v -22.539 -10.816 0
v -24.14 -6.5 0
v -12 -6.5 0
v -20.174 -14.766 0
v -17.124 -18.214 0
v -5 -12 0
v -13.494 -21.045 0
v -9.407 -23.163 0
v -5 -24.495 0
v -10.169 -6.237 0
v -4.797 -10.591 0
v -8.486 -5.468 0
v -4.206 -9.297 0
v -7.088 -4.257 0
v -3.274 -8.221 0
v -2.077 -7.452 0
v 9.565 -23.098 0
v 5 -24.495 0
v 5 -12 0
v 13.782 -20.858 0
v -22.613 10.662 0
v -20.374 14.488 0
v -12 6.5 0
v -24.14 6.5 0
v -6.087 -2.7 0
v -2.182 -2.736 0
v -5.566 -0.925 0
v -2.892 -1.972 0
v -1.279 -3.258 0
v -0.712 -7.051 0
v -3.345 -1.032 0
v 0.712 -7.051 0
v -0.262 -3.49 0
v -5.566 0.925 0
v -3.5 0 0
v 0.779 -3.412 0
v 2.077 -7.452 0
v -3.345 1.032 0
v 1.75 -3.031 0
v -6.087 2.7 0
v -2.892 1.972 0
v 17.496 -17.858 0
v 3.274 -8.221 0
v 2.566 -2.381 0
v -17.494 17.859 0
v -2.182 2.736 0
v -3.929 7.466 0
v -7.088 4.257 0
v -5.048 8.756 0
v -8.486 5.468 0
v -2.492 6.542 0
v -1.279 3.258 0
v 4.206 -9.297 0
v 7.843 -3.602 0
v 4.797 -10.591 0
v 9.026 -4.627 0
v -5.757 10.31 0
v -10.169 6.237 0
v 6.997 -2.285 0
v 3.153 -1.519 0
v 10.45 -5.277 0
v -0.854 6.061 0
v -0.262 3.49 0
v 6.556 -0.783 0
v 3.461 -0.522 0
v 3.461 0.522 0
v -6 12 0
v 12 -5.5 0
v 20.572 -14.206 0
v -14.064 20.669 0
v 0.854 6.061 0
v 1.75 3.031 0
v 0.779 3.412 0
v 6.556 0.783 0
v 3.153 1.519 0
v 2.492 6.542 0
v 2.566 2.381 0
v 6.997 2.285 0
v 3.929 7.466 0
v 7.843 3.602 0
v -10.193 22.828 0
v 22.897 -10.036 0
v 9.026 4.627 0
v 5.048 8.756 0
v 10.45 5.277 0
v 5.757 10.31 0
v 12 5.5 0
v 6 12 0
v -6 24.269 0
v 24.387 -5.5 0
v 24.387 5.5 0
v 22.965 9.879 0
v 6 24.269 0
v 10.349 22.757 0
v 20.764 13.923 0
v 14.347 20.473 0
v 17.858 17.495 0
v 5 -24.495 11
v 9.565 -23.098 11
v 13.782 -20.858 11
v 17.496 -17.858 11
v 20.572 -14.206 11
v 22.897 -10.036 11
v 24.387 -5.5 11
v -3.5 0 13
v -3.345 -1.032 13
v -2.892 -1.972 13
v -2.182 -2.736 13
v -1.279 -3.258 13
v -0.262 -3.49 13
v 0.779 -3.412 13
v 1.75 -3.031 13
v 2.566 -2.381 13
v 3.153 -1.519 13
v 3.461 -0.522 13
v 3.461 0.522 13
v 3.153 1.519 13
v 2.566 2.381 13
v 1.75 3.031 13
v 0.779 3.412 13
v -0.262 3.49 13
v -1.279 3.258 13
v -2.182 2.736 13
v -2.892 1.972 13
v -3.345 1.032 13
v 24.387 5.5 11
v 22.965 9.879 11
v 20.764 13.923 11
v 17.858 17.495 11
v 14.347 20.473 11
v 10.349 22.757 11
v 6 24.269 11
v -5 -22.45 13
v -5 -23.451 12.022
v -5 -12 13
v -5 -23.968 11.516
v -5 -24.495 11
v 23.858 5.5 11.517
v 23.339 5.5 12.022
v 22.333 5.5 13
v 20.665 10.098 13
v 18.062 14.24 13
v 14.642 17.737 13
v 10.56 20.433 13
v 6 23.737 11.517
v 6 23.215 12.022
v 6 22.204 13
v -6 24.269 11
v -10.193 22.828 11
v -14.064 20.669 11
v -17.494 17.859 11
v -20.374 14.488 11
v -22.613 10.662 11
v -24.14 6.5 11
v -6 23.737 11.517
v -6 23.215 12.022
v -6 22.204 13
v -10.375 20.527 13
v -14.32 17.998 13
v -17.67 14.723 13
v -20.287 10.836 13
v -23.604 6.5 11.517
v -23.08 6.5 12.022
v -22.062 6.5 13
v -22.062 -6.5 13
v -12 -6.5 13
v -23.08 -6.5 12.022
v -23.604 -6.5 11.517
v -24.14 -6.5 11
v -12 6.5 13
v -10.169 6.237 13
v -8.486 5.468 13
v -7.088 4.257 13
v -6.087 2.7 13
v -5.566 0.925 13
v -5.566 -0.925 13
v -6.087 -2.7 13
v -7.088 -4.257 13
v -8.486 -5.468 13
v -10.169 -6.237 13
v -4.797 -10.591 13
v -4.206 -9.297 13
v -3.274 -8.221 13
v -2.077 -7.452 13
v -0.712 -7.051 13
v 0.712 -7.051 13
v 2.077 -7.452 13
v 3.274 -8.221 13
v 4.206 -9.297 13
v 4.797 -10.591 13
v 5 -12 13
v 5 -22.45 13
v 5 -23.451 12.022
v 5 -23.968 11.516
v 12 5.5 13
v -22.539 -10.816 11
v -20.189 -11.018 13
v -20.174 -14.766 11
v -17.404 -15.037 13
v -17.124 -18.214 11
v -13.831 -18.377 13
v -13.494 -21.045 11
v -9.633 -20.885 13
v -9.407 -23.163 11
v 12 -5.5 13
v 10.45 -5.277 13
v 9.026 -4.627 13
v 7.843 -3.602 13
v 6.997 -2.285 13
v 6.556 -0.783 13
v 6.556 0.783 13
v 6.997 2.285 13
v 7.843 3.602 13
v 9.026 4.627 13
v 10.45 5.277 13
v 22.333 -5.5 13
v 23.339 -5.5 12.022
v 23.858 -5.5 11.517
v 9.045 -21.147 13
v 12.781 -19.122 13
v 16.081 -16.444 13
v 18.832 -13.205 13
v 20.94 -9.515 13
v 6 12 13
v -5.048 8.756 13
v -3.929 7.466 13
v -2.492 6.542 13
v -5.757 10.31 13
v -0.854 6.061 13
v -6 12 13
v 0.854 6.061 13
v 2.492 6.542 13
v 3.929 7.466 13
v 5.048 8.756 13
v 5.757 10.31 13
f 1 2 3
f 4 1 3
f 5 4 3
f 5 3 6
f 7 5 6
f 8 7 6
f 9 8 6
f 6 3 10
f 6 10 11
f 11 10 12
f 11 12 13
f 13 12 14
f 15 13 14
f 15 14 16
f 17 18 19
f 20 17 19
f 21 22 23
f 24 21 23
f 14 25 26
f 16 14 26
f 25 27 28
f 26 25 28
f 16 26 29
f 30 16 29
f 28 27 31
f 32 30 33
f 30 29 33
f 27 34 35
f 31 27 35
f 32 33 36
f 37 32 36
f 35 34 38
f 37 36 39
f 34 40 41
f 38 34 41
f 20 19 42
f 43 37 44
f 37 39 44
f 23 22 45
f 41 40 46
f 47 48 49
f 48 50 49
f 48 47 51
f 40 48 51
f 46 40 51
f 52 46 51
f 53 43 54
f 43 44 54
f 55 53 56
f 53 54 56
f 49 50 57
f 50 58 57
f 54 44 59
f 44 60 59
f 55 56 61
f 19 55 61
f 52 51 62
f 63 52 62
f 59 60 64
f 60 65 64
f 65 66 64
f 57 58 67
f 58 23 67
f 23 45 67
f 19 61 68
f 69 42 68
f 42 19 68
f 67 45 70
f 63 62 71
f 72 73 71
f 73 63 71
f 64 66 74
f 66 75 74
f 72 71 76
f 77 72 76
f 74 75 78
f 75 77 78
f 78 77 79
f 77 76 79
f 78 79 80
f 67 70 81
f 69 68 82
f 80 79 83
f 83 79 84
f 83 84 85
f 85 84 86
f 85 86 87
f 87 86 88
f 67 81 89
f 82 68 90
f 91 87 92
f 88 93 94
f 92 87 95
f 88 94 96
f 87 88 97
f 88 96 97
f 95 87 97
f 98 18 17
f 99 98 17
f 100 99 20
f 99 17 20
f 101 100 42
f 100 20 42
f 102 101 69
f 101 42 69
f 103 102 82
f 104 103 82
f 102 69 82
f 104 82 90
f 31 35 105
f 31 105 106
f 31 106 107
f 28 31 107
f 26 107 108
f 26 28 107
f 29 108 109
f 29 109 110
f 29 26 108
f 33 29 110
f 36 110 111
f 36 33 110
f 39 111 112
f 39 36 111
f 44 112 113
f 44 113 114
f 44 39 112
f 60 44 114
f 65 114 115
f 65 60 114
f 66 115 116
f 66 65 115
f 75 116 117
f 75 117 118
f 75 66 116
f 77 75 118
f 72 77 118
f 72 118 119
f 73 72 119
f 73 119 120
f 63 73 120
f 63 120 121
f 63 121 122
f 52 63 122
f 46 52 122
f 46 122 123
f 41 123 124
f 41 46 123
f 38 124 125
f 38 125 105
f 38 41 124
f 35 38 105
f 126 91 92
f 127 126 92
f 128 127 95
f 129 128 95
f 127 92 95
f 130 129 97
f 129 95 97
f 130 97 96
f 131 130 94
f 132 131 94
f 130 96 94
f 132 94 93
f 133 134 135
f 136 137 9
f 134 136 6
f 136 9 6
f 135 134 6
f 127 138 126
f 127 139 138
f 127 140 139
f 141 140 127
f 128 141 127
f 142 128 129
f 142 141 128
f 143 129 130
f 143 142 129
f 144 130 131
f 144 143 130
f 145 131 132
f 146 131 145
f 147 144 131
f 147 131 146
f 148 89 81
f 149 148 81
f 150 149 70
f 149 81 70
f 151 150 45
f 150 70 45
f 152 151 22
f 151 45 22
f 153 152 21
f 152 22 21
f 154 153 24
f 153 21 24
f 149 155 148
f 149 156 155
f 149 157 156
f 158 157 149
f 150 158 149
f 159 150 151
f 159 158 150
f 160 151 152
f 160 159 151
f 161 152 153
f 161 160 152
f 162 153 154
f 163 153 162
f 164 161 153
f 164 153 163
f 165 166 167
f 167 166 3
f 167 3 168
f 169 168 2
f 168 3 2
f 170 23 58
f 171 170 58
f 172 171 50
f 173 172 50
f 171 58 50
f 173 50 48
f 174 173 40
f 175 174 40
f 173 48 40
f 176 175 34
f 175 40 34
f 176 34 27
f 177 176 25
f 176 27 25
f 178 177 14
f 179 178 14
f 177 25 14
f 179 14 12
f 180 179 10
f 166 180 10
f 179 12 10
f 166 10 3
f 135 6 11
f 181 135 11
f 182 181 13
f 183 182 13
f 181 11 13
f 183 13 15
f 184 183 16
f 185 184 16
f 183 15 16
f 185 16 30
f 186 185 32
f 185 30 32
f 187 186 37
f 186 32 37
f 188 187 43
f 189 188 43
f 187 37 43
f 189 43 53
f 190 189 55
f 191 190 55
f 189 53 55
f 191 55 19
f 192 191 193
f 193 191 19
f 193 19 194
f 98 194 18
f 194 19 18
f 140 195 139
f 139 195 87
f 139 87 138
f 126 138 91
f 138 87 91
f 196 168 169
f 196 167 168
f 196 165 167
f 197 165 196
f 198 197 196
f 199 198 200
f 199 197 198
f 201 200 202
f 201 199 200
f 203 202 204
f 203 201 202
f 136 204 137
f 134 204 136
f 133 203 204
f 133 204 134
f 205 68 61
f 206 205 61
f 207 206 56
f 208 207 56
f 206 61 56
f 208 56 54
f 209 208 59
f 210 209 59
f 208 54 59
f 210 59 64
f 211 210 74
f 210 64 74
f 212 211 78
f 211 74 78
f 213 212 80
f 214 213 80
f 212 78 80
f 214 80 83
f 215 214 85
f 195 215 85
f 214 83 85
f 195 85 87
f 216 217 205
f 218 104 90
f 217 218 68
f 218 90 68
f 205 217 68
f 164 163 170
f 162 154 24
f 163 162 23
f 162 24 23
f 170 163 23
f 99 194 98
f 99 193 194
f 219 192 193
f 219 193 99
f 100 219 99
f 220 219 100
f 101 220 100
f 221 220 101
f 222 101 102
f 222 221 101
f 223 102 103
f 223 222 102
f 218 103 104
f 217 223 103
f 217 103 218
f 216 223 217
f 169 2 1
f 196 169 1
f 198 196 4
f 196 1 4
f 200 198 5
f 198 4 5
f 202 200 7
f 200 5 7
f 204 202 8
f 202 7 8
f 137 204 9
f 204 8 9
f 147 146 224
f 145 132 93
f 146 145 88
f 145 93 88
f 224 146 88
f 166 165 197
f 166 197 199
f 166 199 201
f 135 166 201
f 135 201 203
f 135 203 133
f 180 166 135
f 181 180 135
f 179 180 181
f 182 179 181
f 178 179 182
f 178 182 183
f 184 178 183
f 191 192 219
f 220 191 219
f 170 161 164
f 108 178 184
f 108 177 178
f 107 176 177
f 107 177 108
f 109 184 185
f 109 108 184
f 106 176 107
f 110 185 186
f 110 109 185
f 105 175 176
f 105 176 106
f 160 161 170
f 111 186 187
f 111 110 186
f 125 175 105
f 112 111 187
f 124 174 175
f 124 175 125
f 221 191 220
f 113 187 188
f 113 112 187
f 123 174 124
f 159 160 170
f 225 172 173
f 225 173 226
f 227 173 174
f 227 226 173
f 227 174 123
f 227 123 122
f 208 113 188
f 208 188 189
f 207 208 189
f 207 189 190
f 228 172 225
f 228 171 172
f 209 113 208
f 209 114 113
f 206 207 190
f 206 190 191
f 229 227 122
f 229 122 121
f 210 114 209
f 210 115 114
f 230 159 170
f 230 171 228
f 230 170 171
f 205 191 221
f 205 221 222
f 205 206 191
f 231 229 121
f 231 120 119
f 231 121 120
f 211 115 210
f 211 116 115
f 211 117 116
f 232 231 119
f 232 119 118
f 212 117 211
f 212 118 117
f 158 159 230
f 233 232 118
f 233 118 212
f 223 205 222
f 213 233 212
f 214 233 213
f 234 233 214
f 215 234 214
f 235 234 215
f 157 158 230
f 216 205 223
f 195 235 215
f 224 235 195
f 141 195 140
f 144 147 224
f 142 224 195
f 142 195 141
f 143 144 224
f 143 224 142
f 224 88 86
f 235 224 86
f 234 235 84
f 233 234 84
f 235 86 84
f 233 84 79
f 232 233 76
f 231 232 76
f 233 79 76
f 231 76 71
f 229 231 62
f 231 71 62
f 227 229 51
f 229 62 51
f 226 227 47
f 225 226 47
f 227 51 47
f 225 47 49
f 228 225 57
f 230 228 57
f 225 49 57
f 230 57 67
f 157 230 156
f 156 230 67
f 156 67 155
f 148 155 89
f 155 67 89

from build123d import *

# Parameters (mm, degrees)
SKETCH1_R           = 3.5
BOSS_EXTRUDE1_DEPTH = 13
CHAMFER1_SIZE       = 2


with BuildPart() as part:
    # Sketch1 → Boss-Extrude1 (new body)
    with BuildSketch(Plane.XY):
        with BuildLine():
            ThreePointArc((24.387496797, 5.5), (17.858383307, 17.495089187), (6, 24.269322199))
            Line((6, 24.269322199), (6, 12))
            ThreePointArc((6, 12), (0, 6), (-6, 12))
            Line((-6, 12), (-6, 24.269322199))
            ThreePointArc((-6, 24.269322199), (-17.494151854, 17.859301524), (-24.140215409, 6.5))
            Line((-24.140215409, 6.5), (-12, 6.5))
            ThreePointArc((-12, 6.5), (-5.5, 0), (-12, -6.5))
            Line((-12, -6.5), (-24.140215409, -6.5))
            ThreePointArc((-24.140215409, -6.5), (-17.124313764, -18.214221864), (-5, -24.494897428))
            Line((-5, -24.494897428), (-5, -12))
            ThreePointArc((-5, -12), (0, -7), (5, -12))
            Line((5, -12), (5, -24.494897428))
            ThreePointArc((5, -24.494897428), (17.49593593, -17.85755375), (24.387496797, -5.5))
            Line((24.387496797, -5.5), (12, -5.5))
            ThreePointArc((12, -5.5), (6.5, 0), (12, 5.5))
            Line((12, 5.5), (24.387496797, 5.5))
        make_face()
        with Locations(Location((0, 0, 0), (0, 0, 180))):
            Circle(SKETCH1_R, mode=Mode.SUBTRACT)
    extrude(amount=BOSS_EXTRUDE1_DEPTH)

    # Chamfer1
    chamfer1_edges = [part.edges().sort_by_distance(p)[0] for p in [
        (17.49593593, -17.85755375, 13),
        (17.858383307, 17.495089187, 13),
        (-17.494151854, 17.859301524, 13),
        (-17.124313764, -18.214221864, 13),
    ]]
    chamfer(chamfer1_edges, length=CHAMFER1_SIZE)


solid = part.part
